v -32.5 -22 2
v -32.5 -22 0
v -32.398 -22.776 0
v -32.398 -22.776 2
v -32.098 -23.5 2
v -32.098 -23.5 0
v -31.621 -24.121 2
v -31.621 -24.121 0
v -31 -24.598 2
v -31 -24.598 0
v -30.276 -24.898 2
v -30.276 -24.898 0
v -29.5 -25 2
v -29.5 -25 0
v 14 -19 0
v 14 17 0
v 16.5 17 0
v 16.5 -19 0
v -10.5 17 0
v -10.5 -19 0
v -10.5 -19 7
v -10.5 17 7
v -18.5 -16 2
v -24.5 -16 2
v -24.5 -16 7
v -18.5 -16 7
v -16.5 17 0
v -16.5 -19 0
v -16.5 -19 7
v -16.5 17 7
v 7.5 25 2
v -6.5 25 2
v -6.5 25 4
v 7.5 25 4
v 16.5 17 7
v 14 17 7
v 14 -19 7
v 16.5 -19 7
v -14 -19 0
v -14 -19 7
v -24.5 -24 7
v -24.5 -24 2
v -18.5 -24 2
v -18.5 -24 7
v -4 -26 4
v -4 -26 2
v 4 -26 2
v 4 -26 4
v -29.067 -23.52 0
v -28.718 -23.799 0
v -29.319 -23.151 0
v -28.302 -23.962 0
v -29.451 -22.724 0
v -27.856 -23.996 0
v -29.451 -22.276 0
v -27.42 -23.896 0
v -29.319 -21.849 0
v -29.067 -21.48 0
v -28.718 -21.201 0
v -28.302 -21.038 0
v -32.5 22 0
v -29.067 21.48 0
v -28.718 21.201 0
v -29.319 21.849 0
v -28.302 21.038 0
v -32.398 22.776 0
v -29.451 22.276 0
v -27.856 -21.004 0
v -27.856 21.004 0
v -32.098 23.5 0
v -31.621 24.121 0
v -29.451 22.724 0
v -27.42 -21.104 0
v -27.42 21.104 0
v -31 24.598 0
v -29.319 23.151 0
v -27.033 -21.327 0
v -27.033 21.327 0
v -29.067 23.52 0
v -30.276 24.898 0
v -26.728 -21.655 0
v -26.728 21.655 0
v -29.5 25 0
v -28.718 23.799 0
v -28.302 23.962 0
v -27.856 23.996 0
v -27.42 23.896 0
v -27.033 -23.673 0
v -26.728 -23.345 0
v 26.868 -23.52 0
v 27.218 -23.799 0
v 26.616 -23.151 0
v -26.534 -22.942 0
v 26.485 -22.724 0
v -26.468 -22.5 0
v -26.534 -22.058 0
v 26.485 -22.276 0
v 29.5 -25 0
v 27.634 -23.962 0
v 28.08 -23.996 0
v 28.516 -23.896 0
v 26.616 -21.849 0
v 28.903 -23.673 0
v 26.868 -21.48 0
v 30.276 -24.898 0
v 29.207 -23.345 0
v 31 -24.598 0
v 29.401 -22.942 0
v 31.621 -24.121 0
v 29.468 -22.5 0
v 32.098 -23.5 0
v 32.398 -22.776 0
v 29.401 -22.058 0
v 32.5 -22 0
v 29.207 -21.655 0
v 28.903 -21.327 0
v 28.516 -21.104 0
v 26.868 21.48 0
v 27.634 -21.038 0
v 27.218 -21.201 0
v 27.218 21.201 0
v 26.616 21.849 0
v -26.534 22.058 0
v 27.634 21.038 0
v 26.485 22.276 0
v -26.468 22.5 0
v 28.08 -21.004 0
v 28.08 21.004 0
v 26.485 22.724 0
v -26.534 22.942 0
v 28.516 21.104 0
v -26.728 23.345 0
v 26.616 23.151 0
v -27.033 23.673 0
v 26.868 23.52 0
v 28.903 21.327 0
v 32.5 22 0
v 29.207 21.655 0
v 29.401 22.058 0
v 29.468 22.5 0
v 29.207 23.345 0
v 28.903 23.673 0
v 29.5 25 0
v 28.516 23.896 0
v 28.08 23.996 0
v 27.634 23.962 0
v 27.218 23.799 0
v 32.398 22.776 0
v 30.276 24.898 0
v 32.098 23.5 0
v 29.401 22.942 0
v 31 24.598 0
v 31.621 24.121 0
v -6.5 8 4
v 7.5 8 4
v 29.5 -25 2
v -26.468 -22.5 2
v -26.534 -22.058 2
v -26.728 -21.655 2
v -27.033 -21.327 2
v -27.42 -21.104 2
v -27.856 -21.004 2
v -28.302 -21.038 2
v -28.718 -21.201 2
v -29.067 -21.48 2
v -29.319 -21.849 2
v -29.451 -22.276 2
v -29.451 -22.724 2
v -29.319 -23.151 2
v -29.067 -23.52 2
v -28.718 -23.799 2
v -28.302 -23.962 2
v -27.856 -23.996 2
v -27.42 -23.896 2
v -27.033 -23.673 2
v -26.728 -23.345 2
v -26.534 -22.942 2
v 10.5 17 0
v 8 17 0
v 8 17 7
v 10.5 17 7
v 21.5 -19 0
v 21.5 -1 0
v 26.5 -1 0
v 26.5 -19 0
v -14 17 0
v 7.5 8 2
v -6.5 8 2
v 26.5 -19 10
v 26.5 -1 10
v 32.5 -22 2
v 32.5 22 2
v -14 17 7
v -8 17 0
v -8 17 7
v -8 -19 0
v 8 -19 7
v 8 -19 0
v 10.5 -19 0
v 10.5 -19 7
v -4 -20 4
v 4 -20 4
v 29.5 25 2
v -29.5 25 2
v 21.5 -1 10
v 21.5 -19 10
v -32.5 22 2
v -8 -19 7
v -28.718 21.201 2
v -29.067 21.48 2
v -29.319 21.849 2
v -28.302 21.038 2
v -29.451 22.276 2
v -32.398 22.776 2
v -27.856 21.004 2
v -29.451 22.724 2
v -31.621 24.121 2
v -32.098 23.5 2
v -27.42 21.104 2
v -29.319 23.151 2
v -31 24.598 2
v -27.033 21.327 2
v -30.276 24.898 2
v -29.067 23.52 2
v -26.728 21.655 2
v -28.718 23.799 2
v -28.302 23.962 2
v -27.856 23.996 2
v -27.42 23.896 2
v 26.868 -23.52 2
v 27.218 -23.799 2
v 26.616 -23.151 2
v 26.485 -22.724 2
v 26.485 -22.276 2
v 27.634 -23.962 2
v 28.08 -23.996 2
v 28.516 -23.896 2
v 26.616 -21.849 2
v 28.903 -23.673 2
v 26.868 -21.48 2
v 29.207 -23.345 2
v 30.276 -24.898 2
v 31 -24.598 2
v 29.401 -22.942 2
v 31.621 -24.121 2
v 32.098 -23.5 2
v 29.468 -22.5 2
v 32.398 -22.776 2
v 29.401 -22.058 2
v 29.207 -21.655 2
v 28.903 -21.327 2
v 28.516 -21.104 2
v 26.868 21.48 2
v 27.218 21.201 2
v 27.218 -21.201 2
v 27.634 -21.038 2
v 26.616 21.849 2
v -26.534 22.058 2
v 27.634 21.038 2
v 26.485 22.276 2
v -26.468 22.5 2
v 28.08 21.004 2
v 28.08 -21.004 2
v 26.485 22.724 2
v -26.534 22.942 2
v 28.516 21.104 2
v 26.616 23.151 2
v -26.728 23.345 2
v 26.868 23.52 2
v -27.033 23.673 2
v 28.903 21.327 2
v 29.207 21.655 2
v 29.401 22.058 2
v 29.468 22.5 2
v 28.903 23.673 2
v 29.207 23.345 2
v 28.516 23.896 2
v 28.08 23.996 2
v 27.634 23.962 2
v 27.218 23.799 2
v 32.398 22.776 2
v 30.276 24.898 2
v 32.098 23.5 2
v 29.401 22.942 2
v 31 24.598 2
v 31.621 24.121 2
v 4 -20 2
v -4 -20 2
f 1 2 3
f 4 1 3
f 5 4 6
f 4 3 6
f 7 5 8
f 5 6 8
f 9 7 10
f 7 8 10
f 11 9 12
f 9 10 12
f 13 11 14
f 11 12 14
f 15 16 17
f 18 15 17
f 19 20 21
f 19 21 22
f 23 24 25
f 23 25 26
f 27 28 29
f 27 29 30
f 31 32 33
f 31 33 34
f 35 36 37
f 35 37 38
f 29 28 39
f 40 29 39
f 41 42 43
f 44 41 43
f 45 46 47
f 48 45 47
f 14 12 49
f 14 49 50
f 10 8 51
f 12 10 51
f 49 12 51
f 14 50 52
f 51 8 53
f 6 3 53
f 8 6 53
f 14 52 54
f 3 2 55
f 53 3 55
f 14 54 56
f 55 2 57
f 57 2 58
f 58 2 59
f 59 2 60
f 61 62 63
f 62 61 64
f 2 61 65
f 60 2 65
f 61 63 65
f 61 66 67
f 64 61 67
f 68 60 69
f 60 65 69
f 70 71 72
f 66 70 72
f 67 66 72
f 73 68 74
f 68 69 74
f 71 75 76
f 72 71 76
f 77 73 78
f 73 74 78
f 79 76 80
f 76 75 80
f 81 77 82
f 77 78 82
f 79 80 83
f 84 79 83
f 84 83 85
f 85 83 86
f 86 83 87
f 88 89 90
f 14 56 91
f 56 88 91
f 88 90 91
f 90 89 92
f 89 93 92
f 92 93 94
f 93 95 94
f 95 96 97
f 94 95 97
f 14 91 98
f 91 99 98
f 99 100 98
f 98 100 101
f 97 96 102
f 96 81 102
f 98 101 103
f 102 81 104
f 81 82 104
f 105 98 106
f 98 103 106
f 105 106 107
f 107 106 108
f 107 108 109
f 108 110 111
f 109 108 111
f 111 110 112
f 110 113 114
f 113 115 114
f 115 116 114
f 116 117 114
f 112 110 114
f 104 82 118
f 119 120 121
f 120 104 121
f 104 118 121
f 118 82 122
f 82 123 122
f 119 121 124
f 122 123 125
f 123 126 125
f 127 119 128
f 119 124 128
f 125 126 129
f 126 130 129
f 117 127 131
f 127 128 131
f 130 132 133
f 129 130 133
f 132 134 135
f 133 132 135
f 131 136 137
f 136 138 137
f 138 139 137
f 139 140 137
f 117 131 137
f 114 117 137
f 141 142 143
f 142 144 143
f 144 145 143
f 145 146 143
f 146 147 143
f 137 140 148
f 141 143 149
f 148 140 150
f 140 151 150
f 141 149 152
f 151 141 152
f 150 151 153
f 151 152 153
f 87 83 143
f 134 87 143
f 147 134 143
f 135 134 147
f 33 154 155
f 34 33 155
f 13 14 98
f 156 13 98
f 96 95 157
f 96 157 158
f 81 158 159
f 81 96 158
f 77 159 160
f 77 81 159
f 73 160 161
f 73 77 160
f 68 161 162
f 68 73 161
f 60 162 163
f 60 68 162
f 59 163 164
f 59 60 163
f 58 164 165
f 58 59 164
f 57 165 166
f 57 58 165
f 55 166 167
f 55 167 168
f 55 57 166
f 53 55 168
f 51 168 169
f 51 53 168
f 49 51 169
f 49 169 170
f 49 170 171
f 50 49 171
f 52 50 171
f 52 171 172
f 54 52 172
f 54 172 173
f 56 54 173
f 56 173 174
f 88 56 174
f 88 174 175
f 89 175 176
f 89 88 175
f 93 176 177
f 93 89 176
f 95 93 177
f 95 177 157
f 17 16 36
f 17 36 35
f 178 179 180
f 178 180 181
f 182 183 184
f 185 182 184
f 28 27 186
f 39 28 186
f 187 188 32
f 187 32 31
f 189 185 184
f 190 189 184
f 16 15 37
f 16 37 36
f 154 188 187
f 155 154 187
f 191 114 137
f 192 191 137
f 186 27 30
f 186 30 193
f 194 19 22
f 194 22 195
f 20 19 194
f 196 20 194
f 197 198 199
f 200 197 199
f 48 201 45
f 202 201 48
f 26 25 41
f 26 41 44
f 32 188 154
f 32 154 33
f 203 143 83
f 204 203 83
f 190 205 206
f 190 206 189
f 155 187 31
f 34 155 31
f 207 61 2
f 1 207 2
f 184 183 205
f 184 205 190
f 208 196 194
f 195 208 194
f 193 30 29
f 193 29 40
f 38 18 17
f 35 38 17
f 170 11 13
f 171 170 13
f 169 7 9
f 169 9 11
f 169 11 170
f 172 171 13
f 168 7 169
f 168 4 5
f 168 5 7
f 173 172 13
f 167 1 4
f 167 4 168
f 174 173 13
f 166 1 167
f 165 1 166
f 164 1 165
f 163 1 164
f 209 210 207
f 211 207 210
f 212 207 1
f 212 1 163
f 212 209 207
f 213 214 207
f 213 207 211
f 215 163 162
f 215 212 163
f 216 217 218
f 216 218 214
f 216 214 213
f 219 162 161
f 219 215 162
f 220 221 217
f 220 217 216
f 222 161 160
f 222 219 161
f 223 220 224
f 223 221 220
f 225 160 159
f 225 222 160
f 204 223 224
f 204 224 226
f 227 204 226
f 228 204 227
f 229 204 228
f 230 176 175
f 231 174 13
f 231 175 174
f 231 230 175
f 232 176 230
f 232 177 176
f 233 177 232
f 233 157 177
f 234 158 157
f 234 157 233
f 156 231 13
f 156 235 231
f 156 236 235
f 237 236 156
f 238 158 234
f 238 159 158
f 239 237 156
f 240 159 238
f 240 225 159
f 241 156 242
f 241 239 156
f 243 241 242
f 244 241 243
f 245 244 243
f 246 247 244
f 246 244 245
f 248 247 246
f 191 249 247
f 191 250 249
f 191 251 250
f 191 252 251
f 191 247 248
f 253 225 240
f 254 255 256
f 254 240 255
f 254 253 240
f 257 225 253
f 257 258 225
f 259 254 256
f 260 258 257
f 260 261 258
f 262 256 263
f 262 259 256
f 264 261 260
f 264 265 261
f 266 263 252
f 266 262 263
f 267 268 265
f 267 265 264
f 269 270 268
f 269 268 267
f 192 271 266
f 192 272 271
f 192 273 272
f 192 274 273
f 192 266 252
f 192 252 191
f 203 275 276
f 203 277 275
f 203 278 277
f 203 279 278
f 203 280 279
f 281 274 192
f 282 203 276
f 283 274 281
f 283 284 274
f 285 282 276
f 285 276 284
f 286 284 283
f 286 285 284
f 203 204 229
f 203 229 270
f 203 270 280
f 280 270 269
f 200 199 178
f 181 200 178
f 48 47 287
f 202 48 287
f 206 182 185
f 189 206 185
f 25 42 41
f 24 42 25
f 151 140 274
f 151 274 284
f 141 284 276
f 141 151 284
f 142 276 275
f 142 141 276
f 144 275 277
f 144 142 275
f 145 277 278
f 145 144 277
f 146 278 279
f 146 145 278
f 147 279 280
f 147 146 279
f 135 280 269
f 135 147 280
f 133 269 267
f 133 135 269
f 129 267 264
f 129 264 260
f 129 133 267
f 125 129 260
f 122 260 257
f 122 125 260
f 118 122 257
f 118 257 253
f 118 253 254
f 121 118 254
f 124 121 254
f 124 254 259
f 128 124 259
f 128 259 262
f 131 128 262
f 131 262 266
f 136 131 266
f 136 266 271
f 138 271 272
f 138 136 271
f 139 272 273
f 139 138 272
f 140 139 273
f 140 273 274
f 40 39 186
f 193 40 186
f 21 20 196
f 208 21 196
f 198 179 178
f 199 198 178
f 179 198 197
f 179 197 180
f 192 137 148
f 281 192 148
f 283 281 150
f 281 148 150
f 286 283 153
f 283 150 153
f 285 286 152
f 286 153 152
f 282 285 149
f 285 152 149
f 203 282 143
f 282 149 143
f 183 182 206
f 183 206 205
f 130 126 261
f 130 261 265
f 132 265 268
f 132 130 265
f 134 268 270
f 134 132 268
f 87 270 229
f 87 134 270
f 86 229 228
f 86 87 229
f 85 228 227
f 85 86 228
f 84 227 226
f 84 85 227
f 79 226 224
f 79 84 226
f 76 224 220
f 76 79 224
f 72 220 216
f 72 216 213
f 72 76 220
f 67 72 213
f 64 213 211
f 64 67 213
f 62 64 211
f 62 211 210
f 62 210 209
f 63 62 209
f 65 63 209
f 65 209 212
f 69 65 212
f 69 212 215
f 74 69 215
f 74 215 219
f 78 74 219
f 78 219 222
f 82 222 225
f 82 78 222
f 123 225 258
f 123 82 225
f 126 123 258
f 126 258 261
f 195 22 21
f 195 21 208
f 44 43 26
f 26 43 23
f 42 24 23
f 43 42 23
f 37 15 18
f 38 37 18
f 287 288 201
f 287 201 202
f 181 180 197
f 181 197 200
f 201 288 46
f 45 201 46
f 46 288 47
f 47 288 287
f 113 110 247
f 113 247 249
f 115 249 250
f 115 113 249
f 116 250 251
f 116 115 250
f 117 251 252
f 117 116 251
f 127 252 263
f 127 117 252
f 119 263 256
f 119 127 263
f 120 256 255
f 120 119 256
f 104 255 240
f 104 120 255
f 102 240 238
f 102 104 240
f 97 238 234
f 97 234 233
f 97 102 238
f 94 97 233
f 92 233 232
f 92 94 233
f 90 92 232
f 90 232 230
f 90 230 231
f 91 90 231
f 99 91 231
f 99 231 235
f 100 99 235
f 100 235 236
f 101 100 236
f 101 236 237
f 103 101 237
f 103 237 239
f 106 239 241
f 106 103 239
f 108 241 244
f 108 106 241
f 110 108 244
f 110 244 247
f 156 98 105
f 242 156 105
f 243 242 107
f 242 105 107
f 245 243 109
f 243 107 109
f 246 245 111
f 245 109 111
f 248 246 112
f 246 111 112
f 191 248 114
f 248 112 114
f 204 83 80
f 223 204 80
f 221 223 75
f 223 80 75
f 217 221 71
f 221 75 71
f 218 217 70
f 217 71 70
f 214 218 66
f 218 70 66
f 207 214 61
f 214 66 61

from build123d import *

# Parameters (mm, degrees)
F0_R     = 1.5
F0_W     = 6
F0_H     = 8
F0_W_2   = 2.5
F0_H_2   = 36
F0_W_3   = 5
F0_H_3   = 18
F0_W_4   = 8
F0_H_4   = 5
F0_W_5   = 14
F0_H_5   = 17
F1_DEPTH = 2
F2_DEPTH = 7
F3_START = 2
F3_DEPTH = 2
F4_DEPTH = 10
F5_START = 2
F0_H_6   = 1
F5_DEPTH = 2
F6_START = 2
F6_DEPTH = 5


with BuildPart() as f1:
    # F0 (on Top) → F1 (new body)
    with BuildSketch(Plane.XY):
        with BuildLine():
            Line((4, -25), (29.5, -25))
            ThreePointArc((29.5, -25), (31.6213203436, -24.1213203436), (32.5, -22))
            Line((32.5, -22), (32.5, 22))
            ThreePointArc((32.5, 22), (31.6213203436, 24.1213203436), (29.5, 25))
            Line((29.5, 25), (7.5, 25))
            Line((7.5, 25), (7.5, 8))
            Line((7.5, 8), (-6.5, 8))
            Line((-6.5, 8), (-6.5, 25))
            Line((-6.5, 25), (-29.5, 25))
            ThreePointArc((-29.5, 25), (-31.6213203436, 24.1213203436), (-32.5, 22))
            Line((-32.5, 22), (-32.5, -22))
            ThreePointArc((-32.5, -22), (-31.6213203436, -24.1213203436), (-29.5, -25))
            Line((-29.5, -25), (-4, -25))
            Line((-4, -25), (-4, -20))
            Line((-4, -20), (4, -20))
            Line((4, -20), (4, -25))
        make_face()
        with Locations((-27.9677915107, -22.5000023739)):
            Circle(F0_R, mode=Mode.SUBTRACT)
        with Locations((-21.5, -20)):
            Rectangle(F0_W, F0_H, mode=Mode.SUBTRACT)
        with Locations((-15.25, -1)):
            Rectangle(F0_W_2, F0_H_2, mode=Mode.SUBTRACT)
        with Locations((-9.25, -1)):
            Rectangle(F0_W_2, F0_H_2, mode=Mode.SUBTRACT)
        with Locations((27.9677915107, -22.5000023739)):
            Circle(F0_R, mode=Mode.SUBTRACT)
        with Locations((9.25, -1)):
            Rectangle(F0_W_2, F0_H_2, mode=Mode.SUBTRACT)
        with Locations((15.25, -1)):
            Rectangle(F0_W_2, F0_H_2, mode=Mode.SUBTRACT)
        with Locations((24, -10)):
            Rectangle(F0_W_3, F0_H_3, mode=Mode.SUBTRACT)
        with Locations((-27.9677915107, 22.5000023739)):
            Circle(F0_R, mode=Mode.SUBTRACT)
        with Locations((27.9677915107, 22.5000023739)):
            Circle(F0_R, mode=Mode.SUBTRACT)
        with Locations((-21.5, -20)):
            Rectangle(F0_W, F0_H)
        with Locations((-15.25, -1)):
            Rectangle(F0_W_2, F0_H_2)
        with Locations((-9.25, -1)):
            Rectangle(F0_W_2, F0_H_2)
        with Locations((0, -22.5)):
            Rectangle(F0_W_4, F0_H_4)
        with Locations((9.25, -1)):
            Rectangle(F0_W_2, F0_H_2)
        with Locations((15.25, -1)):
            Rectangle(F0_W_2, F0_H_2)
        with Locations((24, -10)):
            Rectangle(F0_W_3, F0_H_3)
        with Locations((0.5, 16.5)):
            Rectangle(F0_W_5, F0_H_5)
    extrude(amount=F1_DEPTH)


with BuildPart() as f2:
    # F0 (on Top) → F2 (new body)
    with BuildSketch(Plane.XY):
        with Locations((9.25, -1)):
            Rectangle(F0_W_2, F0_H_2)
    extrude(amount=F2_DEPTH)


with BuildPart() as f2b:
    # F0 (on Top) → F2, piece 2 (new body)
    with BuildSketch(Plane.XY):
        with Locations((15.25, -1)):
            Rectangle(F0_W_2, F0_H_2)
    extrude(amount=F2_DEPTH)


with BuildPart() as f2c:
    # F0 (on Top) → F2, piece 3 (new body)
    with BuildSketch(Plane.XY):
        with Locations((-9.25, -1)):
            Rectangle(F0_W_2, F0_H_2)
    extrude(amount=F2_DEPTH)


with BuildPart() as f2d:
    # F0 (on Top) → F2, piece 4 (new body)
    with BuildSketch(Plane.XY):
        with Locations((-15.25, -1)):
            Rectangle(F0_W_2, F0_H_2)
    extrude(amount=F2_DEPTH)


with BuildPart() as f3:
    # F0 (on Top) → F3 (new body)
    with BuildSketch(Plane.XY.offset(F3_START)):
        with Locations((0.5, 16.5)):
            Rectangle(F0_W_5, F0_H_5)
    extrude(amount=F3_DEPTH)


with BuildPart() as f4:
    # F0 (on Top) → F4 (new body)
    with BuildSketch(Plane.XY):
        with Locations((24, -10)):
            Rectangle(F0_W_3, F0_H_3)
    extrude(amount=F4_DEPTH)


with BuildPart() as f5:
    # F0 (on Top) → F5 (new body)
    with BuildSketch(Plane.XY.offset(F5_START)):
        with Locations((0, -22.5)):
            Rectangle(F0_W_4, F0_H_4)
        with Locations((0, -25.5)):
            Rectangle(F0_W_4, F0_H_6)
    extrude(amount=F5_DEPTH)


with BuildPart() as f6:
    # F0 (on Top) → F6 (new body)
    with BuildSketch(Plane.XY.offset(F6_START)):
        with Locations((-21.5, -20)):
            Rectangle(F0_W, F0_H)
    extrude(amount=F6_DEPTH)


solid = Compound([f1.part, f2.part, f2b.part, f2c.part, f2d.part, f3.part, f4.part, f5.part, f6.part])
